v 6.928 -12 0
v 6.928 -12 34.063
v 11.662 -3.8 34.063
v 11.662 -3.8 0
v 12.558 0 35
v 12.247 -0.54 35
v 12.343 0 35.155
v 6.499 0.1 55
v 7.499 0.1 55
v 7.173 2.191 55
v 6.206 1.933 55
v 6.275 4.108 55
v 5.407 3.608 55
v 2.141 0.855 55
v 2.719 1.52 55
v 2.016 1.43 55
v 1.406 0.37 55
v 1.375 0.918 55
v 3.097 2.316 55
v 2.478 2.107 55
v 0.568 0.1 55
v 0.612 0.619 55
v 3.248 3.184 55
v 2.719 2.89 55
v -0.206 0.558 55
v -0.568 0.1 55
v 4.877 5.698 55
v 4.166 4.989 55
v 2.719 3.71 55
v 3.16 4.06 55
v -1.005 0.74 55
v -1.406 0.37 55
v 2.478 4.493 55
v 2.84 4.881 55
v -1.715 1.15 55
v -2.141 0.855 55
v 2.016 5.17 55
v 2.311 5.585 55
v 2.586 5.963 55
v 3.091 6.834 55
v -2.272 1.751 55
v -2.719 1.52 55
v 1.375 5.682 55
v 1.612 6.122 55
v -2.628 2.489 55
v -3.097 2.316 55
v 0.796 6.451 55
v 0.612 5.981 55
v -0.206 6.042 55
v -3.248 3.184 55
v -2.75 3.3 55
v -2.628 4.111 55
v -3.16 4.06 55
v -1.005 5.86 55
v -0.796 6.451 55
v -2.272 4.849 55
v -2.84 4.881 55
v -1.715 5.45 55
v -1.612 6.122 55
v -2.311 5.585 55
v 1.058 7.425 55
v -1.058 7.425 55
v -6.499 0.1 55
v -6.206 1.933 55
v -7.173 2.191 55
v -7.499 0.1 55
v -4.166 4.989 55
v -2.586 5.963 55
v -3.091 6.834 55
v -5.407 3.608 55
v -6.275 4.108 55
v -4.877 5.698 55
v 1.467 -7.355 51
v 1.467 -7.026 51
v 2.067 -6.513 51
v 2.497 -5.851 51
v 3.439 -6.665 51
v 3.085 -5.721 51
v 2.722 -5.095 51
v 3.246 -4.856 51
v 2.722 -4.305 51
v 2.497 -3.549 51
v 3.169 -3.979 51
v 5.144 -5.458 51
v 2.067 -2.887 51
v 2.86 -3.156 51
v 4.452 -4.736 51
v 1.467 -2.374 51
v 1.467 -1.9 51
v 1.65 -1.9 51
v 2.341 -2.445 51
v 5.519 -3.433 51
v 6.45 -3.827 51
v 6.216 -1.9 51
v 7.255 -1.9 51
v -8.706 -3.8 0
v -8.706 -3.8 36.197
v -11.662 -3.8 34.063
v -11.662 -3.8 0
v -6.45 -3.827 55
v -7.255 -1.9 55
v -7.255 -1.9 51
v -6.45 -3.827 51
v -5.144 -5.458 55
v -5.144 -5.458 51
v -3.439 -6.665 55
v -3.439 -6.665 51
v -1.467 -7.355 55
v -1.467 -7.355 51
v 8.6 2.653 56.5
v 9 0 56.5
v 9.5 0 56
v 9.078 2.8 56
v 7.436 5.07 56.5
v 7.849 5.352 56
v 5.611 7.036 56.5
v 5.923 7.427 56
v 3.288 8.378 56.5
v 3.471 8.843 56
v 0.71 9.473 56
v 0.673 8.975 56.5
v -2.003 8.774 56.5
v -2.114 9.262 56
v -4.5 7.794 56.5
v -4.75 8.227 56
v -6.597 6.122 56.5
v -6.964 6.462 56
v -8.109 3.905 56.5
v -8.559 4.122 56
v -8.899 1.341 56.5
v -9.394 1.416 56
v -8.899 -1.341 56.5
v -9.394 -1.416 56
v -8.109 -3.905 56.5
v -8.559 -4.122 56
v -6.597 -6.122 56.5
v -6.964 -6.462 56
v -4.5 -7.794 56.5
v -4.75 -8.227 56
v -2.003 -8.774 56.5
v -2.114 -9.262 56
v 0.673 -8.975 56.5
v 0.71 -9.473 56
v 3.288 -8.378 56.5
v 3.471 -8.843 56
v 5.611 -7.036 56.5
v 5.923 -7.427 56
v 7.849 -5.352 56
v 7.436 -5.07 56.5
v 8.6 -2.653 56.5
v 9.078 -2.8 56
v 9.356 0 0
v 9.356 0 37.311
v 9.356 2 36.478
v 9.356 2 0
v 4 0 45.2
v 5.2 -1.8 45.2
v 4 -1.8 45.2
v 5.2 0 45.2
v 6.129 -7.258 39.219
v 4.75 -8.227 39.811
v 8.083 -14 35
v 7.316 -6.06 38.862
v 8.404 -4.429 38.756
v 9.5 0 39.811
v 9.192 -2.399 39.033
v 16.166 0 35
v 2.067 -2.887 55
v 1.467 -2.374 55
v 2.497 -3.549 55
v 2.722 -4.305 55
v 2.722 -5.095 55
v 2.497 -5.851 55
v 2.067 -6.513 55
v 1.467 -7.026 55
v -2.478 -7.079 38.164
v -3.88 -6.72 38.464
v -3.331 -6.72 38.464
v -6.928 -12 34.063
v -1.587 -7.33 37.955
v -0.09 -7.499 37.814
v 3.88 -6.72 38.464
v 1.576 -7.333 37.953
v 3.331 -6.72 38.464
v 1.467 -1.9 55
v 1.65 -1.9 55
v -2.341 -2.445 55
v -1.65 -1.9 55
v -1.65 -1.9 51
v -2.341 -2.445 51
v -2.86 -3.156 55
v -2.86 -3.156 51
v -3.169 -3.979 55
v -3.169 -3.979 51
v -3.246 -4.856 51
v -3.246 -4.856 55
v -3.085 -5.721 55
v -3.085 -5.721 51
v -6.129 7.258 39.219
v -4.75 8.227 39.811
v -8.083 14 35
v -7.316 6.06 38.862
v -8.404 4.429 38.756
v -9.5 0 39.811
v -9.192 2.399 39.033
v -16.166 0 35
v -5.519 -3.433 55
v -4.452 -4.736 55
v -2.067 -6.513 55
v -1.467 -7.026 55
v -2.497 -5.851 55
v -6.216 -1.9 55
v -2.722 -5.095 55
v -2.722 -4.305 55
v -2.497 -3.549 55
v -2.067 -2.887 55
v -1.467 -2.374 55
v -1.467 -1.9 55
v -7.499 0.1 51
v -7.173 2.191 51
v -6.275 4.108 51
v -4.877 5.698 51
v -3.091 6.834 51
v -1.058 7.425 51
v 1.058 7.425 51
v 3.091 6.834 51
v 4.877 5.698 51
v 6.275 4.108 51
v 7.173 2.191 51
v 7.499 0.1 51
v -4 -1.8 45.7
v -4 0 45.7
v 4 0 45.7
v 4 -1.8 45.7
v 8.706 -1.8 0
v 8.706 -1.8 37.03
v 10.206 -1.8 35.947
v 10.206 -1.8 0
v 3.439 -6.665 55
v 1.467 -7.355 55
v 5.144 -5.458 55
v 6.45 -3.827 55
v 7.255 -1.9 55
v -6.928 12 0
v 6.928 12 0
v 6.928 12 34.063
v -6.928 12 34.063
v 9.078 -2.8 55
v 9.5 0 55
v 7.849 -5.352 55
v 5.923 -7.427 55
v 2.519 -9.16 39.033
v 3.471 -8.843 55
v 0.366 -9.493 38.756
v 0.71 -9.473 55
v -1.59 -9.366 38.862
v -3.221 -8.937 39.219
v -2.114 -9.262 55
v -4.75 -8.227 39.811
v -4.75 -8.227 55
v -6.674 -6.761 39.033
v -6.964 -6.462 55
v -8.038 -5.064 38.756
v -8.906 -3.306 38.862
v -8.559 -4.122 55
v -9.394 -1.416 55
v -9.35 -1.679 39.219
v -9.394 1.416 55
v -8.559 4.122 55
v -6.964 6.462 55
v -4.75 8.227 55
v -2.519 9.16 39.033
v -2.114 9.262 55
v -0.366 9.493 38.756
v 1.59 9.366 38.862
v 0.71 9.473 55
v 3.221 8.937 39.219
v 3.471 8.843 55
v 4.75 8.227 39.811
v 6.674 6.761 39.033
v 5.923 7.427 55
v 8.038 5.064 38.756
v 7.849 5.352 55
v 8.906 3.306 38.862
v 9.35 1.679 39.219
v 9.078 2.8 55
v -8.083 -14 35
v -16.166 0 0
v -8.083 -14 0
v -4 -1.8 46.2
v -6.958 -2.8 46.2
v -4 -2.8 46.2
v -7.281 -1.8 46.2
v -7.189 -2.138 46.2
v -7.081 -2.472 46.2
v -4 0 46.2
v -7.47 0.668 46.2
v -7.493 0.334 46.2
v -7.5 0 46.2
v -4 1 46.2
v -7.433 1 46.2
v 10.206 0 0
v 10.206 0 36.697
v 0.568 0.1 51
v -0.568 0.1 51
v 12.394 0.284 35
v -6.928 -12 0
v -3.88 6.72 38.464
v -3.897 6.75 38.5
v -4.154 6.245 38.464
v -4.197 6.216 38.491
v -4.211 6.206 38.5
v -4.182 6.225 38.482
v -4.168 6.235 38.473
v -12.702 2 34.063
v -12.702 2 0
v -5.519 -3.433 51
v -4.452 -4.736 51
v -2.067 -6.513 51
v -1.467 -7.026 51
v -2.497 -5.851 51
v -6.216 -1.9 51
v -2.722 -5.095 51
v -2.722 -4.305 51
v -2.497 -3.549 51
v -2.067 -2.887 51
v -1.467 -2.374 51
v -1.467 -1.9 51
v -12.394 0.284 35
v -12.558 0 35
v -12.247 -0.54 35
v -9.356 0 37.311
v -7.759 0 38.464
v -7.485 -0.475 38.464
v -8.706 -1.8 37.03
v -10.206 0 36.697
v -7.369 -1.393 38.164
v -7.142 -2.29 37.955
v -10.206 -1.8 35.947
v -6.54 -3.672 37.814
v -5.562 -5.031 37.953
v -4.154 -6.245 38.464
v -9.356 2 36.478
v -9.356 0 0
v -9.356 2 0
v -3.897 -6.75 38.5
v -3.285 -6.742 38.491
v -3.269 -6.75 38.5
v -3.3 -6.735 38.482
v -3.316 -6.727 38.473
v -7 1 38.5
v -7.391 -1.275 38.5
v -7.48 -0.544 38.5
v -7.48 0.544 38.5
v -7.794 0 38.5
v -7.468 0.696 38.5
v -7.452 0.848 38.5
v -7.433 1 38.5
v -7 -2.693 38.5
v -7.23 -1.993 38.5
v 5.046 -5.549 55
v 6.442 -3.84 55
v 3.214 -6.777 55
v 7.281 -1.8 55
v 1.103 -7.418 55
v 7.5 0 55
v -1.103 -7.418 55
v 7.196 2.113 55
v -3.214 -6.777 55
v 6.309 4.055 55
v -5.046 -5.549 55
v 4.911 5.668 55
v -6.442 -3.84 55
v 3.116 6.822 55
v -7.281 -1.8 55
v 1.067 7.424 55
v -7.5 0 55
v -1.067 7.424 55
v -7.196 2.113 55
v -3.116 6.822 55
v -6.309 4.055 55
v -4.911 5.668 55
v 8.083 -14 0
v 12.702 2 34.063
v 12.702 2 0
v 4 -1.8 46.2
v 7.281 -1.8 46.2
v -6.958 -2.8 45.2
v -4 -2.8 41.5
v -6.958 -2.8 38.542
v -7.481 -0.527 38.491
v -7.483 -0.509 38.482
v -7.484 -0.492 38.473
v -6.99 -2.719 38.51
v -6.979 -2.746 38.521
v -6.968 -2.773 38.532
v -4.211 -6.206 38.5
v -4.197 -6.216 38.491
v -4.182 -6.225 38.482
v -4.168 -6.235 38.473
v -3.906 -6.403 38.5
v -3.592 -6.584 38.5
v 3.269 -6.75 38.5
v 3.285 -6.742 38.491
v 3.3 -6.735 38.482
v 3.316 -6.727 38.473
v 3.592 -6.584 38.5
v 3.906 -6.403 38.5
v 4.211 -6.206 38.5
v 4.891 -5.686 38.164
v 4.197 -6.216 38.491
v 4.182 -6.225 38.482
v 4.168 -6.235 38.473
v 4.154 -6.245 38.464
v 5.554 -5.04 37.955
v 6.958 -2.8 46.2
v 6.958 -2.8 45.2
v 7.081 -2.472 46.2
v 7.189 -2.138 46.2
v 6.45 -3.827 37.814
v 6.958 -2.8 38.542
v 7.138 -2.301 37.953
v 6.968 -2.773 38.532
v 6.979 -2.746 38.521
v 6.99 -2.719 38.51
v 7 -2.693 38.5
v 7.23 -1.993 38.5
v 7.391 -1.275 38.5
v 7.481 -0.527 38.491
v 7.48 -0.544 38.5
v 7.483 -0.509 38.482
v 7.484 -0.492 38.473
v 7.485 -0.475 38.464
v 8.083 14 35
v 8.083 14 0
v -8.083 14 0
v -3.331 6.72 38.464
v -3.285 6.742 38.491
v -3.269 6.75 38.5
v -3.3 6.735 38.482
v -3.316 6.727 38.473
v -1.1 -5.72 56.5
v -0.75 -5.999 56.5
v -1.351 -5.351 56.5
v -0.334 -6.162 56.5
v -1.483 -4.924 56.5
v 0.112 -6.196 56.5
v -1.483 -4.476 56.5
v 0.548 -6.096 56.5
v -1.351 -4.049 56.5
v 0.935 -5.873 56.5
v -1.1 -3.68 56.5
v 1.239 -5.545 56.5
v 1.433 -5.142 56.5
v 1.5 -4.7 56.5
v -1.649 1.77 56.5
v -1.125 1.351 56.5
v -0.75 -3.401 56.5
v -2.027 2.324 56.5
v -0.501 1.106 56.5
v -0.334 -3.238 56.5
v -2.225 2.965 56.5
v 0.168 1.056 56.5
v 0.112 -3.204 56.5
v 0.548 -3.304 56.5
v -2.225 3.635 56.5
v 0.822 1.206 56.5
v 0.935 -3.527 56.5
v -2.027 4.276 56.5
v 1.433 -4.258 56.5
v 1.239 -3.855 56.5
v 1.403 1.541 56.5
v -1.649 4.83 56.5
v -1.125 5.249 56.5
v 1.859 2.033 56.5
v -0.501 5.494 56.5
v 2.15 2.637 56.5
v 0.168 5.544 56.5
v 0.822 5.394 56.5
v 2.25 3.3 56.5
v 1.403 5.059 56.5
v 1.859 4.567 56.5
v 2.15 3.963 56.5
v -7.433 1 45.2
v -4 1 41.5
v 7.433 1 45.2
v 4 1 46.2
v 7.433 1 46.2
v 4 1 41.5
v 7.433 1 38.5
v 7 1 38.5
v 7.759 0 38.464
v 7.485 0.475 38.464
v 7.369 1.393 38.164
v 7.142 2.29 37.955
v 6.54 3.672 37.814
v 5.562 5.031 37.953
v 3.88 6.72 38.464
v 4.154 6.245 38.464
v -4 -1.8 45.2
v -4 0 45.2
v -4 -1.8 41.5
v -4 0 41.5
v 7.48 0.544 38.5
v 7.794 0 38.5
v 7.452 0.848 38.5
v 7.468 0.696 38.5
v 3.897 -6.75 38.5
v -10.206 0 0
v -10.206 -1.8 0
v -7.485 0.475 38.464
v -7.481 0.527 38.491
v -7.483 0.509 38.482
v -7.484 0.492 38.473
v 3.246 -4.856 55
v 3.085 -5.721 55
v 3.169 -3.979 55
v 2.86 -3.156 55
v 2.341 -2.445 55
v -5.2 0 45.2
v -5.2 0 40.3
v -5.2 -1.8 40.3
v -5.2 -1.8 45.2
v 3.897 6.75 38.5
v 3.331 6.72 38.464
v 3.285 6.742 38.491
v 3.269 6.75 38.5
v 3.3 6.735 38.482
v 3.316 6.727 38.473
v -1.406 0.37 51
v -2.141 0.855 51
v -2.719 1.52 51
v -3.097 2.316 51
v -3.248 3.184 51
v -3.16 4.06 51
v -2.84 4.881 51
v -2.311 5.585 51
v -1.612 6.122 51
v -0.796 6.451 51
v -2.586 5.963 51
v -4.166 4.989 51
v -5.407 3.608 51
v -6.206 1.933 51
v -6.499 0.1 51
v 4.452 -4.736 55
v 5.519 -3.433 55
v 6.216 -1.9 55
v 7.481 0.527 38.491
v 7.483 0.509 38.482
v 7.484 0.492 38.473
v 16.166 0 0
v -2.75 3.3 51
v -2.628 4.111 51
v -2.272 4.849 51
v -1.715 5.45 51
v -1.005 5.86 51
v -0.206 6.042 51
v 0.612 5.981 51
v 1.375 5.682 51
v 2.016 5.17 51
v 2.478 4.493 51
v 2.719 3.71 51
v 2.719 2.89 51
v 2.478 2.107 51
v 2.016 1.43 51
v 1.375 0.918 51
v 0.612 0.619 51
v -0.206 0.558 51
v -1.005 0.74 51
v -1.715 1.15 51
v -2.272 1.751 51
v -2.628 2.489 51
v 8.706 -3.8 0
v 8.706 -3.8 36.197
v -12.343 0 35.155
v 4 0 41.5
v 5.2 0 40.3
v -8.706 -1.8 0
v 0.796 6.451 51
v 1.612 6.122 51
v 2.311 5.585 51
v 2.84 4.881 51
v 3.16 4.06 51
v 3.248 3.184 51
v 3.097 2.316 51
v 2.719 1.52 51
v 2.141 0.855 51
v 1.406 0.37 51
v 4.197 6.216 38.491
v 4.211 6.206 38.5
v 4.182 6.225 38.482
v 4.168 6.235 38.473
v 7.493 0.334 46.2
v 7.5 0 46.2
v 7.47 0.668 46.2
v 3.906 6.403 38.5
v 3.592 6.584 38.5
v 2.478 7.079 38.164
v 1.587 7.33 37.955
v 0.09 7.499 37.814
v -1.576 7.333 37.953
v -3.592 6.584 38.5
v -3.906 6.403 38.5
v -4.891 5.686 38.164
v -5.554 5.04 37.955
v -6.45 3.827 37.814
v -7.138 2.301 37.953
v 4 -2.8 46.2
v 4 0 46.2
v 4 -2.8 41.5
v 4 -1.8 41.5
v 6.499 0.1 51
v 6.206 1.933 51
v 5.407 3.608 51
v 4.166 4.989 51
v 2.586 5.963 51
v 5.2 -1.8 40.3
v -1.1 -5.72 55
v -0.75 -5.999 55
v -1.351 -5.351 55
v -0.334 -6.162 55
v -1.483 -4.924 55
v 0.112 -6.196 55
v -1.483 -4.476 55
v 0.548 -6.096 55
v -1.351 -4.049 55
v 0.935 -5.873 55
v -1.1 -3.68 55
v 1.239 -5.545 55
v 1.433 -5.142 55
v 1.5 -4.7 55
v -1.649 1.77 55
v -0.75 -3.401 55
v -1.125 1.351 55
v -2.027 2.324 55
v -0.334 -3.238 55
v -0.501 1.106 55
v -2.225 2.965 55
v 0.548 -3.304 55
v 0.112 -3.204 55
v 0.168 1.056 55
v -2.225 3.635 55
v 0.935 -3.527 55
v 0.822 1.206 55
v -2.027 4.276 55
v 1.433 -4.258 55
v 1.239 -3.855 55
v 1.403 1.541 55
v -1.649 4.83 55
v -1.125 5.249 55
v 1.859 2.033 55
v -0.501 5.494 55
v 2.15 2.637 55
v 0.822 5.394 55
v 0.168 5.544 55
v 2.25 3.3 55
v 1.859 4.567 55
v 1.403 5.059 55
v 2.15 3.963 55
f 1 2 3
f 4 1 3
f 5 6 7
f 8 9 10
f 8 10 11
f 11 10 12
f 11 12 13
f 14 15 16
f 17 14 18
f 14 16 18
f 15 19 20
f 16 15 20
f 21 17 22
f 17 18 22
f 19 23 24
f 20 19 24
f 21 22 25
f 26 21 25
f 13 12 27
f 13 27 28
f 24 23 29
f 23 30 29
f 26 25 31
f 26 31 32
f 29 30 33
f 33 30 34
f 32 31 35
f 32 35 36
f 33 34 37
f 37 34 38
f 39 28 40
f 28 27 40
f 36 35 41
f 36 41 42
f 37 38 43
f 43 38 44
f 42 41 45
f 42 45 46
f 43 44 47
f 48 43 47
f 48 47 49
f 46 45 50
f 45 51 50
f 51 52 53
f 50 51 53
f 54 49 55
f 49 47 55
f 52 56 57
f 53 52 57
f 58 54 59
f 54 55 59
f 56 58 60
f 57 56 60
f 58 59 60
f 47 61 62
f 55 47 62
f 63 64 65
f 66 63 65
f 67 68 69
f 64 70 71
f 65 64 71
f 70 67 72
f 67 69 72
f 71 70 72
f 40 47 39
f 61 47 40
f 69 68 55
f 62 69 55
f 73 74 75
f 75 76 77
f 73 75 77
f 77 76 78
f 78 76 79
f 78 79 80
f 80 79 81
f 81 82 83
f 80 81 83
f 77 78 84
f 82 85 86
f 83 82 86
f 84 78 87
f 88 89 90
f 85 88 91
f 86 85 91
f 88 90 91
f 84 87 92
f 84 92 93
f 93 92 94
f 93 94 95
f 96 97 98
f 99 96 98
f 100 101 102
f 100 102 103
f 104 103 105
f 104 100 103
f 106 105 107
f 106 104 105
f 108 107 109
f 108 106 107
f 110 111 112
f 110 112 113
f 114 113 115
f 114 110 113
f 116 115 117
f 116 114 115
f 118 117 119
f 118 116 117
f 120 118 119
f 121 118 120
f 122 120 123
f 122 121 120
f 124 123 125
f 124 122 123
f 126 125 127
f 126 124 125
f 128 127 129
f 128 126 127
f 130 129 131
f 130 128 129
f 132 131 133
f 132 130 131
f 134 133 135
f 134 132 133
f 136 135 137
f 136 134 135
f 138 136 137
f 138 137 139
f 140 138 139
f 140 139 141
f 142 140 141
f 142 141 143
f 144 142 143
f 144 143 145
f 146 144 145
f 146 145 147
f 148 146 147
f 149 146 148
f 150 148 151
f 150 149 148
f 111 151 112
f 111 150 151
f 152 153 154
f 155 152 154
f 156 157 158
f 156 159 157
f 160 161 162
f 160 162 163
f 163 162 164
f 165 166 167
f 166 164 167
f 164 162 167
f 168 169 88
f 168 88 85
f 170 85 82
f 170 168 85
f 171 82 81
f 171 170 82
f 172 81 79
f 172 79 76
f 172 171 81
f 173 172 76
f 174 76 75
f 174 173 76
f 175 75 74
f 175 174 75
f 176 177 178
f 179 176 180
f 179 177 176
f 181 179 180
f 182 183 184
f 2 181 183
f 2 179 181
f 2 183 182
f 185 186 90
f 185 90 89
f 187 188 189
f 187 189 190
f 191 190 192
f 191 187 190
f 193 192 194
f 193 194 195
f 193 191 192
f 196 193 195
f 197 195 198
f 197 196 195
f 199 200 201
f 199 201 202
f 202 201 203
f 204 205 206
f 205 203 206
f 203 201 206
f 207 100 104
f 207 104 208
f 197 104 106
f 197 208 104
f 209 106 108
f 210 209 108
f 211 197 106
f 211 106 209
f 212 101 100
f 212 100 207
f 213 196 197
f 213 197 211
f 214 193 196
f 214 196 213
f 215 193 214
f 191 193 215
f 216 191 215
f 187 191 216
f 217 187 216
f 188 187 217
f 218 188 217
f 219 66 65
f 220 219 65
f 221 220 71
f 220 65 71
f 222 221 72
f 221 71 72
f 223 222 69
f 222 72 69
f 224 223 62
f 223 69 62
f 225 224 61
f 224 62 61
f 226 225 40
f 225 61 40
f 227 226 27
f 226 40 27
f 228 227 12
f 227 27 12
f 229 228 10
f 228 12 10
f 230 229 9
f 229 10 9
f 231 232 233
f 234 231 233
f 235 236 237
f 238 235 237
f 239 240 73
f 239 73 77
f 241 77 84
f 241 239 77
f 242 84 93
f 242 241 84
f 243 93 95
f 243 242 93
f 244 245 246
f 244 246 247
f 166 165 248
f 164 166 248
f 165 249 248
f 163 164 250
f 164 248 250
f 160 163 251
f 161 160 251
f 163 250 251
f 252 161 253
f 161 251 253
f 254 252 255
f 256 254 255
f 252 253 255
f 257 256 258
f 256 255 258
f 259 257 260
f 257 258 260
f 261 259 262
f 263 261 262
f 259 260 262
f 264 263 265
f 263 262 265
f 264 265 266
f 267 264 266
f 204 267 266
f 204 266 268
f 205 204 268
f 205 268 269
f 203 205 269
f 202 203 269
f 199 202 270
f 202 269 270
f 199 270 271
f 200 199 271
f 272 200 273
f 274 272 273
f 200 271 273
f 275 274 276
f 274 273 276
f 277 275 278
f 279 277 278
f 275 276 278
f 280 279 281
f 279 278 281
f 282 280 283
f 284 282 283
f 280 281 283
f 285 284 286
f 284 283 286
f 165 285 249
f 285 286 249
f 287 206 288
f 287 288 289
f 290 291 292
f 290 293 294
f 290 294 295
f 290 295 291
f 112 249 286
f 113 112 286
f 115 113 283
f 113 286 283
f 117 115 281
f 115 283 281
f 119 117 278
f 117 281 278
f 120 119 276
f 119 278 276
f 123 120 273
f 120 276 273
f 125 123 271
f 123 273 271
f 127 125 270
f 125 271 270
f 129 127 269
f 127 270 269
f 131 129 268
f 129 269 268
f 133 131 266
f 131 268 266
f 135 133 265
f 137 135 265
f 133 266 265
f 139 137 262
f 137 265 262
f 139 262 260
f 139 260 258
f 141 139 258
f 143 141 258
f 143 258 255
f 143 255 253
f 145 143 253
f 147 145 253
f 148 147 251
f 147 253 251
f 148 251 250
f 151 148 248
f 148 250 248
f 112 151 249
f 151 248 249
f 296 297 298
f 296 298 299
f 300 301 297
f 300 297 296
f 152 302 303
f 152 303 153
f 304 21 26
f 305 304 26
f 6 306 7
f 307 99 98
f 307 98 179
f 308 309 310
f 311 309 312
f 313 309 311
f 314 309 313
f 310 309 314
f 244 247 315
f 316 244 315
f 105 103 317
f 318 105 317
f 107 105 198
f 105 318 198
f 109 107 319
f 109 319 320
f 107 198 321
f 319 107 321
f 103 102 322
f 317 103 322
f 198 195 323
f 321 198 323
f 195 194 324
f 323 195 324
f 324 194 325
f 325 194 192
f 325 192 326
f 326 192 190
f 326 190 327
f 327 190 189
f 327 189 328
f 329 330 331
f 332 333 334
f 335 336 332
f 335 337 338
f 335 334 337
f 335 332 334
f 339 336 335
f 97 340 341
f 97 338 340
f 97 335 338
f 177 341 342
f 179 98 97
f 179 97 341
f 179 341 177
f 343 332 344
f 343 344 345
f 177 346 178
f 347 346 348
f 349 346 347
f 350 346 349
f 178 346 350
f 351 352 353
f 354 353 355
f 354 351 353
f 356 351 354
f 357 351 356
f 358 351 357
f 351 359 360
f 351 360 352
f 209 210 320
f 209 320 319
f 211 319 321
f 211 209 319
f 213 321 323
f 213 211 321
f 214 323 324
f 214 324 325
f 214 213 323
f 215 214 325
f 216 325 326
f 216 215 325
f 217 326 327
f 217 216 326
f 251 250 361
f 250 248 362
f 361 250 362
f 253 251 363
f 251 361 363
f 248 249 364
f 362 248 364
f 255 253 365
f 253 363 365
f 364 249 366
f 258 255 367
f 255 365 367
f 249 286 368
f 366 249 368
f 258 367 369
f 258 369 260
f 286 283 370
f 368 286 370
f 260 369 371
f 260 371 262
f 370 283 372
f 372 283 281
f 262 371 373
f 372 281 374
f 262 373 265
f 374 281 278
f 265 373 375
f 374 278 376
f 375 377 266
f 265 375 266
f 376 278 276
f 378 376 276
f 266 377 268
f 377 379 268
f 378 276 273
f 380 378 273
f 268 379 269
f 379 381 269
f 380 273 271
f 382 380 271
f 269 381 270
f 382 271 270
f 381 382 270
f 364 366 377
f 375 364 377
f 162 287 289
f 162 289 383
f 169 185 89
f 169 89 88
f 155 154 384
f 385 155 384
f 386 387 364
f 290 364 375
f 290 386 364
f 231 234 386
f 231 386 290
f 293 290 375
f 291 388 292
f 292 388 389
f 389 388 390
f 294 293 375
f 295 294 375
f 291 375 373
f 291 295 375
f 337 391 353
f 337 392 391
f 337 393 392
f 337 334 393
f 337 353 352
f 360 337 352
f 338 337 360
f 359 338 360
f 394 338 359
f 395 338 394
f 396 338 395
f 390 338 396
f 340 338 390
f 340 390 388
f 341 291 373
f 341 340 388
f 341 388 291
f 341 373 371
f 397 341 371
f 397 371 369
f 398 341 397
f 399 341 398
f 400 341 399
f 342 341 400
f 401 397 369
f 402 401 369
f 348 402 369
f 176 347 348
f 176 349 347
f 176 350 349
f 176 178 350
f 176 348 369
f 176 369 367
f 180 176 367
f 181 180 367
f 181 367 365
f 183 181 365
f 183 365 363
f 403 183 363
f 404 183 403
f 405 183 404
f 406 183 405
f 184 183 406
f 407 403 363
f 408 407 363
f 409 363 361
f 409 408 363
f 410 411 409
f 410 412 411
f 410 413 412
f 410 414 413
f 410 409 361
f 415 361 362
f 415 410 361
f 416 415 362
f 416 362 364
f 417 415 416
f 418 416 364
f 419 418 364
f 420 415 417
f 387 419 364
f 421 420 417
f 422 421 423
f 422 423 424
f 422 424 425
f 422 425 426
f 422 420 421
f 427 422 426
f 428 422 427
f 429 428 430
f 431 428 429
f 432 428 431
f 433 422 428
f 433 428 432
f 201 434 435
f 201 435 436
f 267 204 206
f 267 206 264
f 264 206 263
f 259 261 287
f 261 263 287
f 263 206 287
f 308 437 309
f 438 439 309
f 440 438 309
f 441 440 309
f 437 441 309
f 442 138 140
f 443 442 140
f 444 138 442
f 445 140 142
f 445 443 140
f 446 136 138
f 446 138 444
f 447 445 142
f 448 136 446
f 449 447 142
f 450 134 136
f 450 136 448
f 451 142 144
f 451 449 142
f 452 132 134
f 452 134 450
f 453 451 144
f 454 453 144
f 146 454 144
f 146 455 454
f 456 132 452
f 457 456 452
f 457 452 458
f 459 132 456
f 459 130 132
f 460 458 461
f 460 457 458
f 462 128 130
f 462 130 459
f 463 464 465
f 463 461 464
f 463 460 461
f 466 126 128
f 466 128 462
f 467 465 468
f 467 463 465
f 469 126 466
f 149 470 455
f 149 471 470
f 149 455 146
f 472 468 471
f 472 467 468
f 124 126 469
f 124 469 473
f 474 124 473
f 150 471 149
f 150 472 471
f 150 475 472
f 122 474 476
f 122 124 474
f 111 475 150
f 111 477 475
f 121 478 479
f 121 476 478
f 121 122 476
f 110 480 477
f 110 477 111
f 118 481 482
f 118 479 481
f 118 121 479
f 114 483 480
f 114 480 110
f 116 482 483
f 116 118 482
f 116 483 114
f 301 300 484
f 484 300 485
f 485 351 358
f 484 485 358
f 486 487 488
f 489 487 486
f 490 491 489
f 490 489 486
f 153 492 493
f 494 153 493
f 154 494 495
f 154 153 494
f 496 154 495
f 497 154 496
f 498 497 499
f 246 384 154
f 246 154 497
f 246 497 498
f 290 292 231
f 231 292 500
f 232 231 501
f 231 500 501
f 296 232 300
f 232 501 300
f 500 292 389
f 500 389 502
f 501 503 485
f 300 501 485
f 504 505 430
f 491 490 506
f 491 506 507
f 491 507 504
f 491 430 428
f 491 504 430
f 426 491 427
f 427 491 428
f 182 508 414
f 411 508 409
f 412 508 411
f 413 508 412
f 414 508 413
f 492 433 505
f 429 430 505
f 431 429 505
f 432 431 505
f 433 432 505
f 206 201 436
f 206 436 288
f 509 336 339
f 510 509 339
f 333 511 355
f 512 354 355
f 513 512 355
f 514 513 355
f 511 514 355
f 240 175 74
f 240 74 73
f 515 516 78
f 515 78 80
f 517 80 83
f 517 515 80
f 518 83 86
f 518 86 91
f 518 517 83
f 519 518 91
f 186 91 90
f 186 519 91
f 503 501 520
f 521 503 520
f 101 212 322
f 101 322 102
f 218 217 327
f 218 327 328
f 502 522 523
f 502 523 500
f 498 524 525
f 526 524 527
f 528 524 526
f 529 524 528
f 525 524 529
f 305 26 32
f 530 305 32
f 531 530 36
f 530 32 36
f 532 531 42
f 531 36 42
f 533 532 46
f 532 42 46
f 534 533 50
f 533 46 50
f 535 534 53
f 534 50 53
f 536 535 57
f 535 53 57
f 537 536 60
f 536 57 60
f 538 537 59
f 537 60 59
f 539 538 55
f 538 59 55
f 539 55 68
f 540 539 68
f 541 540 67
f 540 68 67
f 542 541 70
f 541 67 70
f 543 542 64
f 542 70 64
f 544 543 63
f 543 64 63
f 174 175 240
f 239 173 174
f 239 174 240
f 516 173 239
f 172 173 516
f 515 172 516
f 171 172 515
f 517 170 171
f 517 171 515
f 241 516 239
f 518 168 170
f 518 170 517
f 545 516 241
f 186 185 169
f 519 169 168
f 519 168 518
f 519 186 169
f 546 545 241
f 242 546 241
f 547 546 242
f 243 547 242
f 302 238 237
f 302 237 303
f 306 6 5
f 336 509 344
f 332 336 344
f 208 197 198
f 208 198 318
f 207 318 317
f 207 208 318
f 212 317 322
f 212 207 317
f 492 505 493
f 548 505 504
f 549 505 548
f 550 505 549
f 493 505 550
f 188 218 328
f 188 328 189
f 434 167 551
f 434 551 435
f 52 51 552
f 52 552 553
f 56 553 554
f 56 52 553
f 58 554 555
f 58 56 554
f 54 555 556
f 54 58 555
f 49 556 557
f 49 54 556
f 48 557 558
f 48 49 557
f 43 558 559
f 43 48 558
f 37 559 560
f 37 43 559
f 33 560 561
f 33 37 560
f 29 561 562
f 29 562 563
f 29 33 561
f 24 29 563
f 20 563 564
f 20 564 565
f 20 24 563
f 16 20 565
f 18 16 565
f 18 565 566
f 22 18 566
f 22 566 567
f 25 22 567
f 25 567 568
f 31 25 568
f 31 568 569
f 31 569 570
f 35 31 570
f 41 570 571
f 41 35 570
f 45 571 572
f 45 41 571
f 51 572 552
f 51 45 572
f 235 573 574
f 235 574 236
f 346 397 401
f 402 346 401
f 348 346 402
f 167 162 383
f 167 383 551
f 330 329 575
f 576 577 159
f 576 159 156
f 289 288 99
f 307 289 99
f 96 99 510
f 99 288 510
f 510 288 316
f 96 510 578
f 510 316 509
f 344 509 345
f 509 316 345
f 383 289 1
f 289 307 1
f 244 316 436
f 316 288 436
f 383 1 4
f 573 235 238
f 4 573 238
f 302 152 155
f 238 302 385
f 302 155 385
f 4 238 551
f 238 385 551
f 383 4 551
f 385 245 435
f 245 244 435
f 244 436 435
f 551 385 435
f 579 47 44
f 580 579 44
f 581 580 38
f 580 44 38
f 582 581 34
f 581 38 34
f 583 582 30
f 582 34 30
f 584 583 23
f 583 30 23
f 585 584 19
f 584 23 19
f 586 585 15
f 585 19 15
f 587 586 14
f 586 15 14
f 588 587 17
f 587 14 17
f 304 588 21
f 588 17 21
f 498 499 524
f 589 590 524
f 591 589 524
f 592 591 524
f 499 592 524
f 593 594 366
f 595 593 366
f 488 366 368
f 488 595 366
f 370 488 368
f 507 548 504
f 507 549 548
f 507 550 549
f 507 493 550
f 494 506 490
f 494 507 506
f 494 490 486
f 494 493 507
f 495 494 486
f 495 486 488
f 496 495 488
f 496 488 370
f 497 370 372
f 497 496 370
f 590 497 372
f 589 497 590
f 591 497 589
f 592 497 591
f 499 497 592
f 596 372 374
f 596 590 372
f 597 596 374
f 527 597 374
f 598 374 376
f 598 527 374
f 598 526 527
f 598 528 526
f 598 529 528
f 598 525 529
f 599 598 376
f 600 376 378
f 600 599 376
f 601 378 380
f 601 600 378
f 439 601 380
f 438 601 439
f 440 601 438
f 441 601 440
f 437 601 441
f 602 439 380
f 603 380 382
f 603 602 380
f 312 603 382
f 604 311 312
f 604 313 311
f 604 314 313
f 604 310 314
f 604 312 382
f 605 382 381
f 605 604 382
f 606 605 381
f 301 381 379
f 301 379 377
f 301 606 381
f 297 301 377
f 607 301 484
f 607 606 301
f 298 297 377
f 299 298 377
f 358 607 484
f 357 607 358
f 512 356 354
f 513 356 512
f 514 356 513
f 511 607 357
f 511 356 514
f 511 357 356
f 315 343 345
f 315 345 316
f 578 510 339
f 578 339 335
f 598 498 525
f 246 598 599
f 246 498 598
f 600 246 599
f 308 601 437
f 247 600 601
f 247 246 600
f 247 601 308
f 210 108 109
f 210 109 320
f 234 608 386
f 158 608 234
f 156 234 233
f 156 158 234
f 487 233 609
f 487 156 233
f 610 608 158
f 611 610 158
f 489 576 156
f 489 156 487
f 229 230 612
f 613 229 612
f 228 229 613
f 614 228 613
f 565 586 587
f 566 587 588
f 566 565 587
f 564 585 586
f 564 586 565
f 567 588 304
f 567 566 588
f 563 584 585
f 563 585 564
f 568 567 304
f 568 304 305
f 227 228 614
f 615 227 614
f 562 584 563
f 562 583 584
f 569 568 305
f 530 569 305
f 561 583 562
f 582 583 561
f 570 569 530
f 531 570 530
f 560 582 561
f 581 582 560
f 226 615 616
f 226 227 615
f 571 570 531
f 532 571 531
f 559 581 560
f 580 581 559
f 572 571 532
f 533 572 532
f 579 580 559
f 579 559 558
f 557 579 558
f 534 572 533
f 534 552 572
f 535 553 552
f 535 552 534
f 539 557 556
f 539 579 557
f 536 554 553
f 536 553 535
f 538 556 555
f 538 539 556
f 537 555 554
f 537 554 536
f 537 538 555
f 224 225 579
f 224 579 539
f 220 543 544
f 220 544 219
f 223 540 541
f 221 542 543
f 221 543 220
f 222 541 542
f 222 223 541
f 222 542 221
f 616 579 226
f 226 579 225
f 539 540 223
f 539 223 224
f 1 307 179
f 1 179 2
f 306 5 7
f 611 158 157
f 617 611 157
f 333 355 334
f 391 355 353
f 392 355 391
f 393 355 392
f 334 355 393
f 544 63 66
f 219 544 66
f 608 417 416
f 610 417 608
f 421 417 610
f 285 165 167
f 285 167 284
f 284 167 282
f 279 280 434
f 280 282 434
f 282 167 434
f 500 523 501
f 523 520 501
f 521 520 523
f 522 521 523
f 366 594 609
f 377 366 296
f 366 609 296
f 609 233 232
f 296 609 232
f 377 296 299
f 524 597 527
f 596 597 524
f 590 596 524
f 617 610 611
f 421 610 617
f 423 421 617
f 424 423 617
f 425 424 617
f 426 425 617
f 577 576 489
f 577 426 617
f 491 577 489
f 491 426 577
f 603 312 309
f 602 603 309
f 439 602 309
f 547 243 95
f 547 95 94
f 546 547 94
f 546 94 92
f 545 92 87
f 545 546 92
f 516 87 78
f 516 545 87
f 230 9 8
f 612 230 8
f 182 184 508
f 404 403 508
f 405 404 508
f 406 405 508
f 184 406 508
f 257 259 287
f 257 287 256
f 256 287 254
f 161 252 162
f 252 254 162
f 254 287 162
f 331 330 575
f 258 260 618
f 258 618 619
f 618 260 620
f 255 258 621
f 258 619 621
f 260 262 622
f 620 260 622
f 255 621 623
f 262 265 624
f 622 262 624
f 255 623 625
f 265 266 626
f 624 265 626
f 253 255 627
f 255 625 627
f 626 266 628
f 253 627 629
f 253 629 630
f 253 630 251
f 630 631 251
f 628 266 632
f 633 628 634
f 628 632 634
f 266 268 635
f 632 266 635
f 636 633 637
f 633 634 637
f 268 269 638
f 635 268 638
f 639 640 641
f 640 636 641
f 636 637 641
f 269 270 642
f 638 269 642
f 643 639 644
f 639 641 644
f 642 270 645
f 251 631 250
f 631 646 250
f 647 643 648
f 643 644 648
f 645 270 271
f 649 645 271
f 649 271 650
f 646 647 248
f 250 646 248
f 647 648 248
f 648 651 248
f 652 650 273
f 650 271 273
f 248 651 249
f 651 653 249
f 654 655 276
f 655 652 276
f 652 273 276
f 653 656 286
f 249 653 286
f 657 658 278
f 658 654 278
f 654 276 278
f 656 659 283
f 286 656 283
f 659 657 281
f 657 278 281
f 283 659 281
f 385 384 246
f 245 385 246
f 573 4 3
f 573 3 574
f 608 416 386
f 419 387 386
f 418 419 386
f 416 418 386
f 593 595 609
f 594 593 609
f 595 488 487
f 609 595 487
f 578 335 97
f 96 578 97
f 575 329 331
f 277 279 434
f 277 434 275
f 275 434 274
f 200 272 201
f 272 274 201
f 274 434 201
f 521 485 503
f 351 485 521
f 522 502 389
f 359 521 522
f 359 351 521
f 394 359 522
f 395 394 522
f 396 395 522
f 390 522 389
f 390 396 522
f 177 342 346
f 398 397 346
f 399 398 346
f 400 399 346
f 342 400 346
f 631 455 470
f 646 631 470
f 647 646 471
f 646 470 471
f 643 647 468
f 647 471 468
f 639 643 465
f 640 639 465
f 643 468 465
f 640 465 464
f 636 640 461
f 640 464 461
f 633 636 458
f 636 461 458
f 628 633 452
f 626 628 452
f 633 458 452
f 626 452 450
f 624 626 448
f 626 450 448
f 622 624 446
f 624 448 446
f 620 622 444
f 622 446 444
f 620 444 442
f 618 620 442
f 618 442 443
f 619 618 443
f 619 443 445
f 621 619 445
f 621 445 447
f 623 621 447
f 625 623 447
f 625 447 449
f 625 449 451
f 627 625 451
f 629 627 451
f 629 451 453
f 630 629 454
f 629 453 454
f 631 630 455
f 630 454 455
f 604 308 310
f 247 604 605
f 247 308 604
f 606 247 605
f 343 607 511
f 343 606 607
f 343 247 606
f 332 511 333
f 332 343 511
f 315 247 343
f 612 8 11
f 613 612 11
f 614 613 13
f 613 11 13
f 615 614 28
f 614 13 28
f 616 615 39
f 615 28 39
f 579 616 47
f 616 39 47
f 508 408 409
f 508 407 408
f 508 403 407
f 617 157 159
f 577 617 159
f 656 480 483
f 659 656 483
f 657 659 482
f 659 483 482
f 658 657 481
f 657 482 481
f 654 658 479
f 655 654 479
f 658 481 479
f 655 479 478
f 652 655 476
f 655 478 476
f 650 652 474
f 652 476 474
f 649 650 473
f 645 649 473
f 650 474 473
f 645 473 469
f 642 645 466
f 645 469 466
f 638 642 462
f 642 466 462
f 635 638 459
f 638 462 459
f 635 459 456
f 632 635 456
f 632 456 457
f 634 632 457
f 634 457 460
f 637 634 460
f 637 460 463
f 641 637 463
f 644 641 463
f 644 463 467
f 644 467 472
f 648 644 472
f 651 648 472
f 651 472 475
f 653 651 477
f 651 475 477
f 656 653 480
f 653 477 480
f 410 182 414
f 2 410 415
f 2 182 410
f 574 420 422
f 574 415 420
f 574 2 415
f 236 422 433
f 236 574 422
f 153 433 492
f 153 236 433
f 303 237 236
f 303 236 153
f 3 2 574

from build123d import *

# Parameters (mm, degrees)
P_IDAT_VYSUNUT_M1_DEPTH       = 35
P_IDAT_VYSUNUT_M2_DEPTH       = 2
SKICA9_R                      = 9.5
SKICA9_R_2                    = 7.5
P_IDAT_VYSUNUT_M3_DEPTH       = 15
KRUHOV_POLE1_COUNT            = 6
SKICA10_R                     = 9.5
SKICA10_R_2                   = 7.5
P_IDAT_VYSUNUT_M4_DEPTH       = 1.5
ODEBRAT_VYSUNUT_M1_DEPTH      = 10
ODEBRAT_VYSUNUT_M1_DEPTH_BACK = 45.040700872
SKICA11_R                     = 7.5
P_IDAT_VYSUNUT_M5_DEPTH       = 6.7
ZKOSEN_2_SIZE                 = 3
P_IDAT_VYSUNUT_M6_REACH       = 43.016
P_IDAT_VYSUNUT_M7_DEPTH       = 1
P_IDAT_VYSUNUT_M8_DEPTH       = 1.8
SKICA18_R                     = 9.5
P_IDAT_VYSUNUT_M9_DEPTH       = 1.5
SKICA19_R                     = 2.25
SKICA19_R_2                   = 1.5
ODEBRAT_VYSUNUT_M3_DEPTH      = 1.5
P_IDAT_VYSUNUT_M11_DEPTH      = 4
P_IDAT_VYSUNUT_M11_2_DEPTH    = 4
SKICA20_R                     = 2.75
P_IDAT_VYSUNUT_M11_3_DEPTH    = 4
ZKOSEN_3_SIZE                 = 0.5


with BuildPart() as part:
    # Skica1 → Přidat vysunutím1 (new body)
    with BuildSketch(Plane.XY):
        Polygon((-16.165807537, 0), (-8.082903769, -14), (8.082903769, -14), (16.165807537, 0), (8.082903769, 14), (-8.082903769, 14), align=None)
        Polygon((12.701705922, 2), (6.92820323, 12), (-6.92820323, 12), (-12.701705922, 2), (-9.356406461, 2), (-9.356406461, 0), (-10.206406461, 0), (-10.206406461, -1.8), (-8.706406461, -1.8), (-8.706406461, -3.8), (-11.662475438, -3.8), (-6.92820323, -12), (6.92820323, -12), (11.662475438, -3.8), (8.706406461, -3.8), (8.706406461, -1.8), (10.206406461, -1.8), (10.206406461, 0), (9.356406461, 0), (9.356406461, 2), align=None, mode=Mode.SUBTRACT)
    extrude(amount=P_IDAT_VYSUNUT_M1_DEPTH)


with BuildPart() as body_2:
    # Skica6 → Přidat vysunutím2 (new body)
    with BuildSketch(Plane(origin=(0, 22.950819672, 27.540983607), x_dir=(-1, 0, 0), z_dir=(2.1639563313744068e-15, -0.6401843996644798, -0.768221279597376))):
        Polygon((-4.618802154, -19.46160575), (4.618802154, -19.46160575), (8.082903769, -11.651356074), (-8.082903769, -11.651356074), align=None)
    extrude(amount=P_IDAT_VYSUNUT_M2_DEPTH)


with BuildPart() as body_3:
    # Skica9 → Přidat vysunutím3 (new body)
    with BuildSketch(Plane.XY.offset(40)):
        Circle(SKICA9_R)
        Circle(SKICA9_R_2, mode=Mode.SUBTRACT)
    extrude(amount=P_IDAT_VYSUNUT_M3_DEPTH)


with BuildPart() as kruhov_pole1_1:
    # Kruhové pole1: pattern copy
    add(body_2.part.rotate(Axis((0, 0, 0), (0, 0, 1)), 1 * 360 / KRUHOV_POLE1_COUNT))


with BuildPart() as kruhov_pole1_2:
    # Kruhové pole1: pattern copy
    add(body_2.part.rotate(Axis((0, 0, 0), (0, 0, 1)), 2 * 360 / KRUHOV_POLE1_COUNT))


with BuildPart() as kruhov_pole1_3:
    # Kruhové pole1: pattern copy
    add(body_2.part.rotate(Axis((0, 0, 0), (0, 0, 1)), 3 * 360 / KRUHOV_POLE1_COUNT))


with BuildPart() as kruhov_pole1_4:
    # Kruhové pole1: pattern copy
    add(body_2.part.rotate(Axis((0, 0, 0), (0, 0, 1)), 4 * 360 / KRUHOV_POLE1_COUNT))


with BuildPart() as kruhov_pole1_5:
    # Kruhové pole1: pattern copy
    add(body_2.part.rotate(Axis((0, 0, 0), (0, 0, 1)), 5 * 360 / KRUHOV_POLE1_COUNT))


with BuildPart() as body_2_1:
    add(body_2.part)

    add(body_3.part)  # Přidat vysunutím4 merges body 3

    add(kruhov_pole1_1.part)  # Přidat vysunutím4 merges Kruhové pole1_1

    add(kruhov_pole1_2.part)  # Přidat vysunutím4 merges Kruhové pole1_2

    add(kruhov_pole1_3.part)  # Přidat vysunutím4 merges Kruhové pole1_3

    add(kruhov_pole1_4.part)  # Přidat vysunutím4 merges Kruhové pole1_4

    add(kruhov_pole1_5.part)  # Přidat vysunutím4 merges Kruhové pole1_5
    # Skica10 → Přidat vysunutím4 (add)
    with BuildSketch(Plane(origin=(0, 0, 40), x_dir=(-1, 0, 0), z_dir=(0, 0, -1))):
        with Locations(Location((0, 0, 0), (0, 0, 180))):
            Circle(SKICA10_R)
        with Locations(Location((0, 0, 0), (0, 0, 180))):
            Circle(SKICA10_R_2, mode=Mode.SUBTRACT)
    extrude(amount=P_IDAT_VYSUNUT_M4_DEPTH)

    # Skica11 → Odebrat vysunutím1 (cut, two sides: drawn at the far end of the back side and taken through both)
    with BuildSketch(Plane(origin=(0, 0, 38.5), x_dir=(-1, 0, 0), z_dir=(0, 0, -1)).offset(-ODEBRAT_VYSUNUT_M1_DEPTH_BACK)):
        with Locations(Location((0, 0, 0), (0, 0, 180))):
            Circle(SKICA11_R)
    extrude(amount=ODEBRAT_VYSUNUT_M1_DEPTH + ODEBRAT_VYSUNUT_M1_DEPTH_BACK, mode=Mode.SUBTRACT)

    # Skica12 → Přidat vysunutím5 (add)
    with BuildSketch(Plane(origin=(0, 0, 38.5), x_dir=(-1, 0, 0), z_dir=(0, 0, -1))):
        Polygon((-4, -1.8), (-5.2, -1.8), (-5.2, 0), (-4, 0), (-4, 1), (-7.5, 1), (-7.5, -2.8), (-4, -2.8), align=None)
        Polygon((7.5, -2.8), (7.5, 1), (4, 1), (4, 0), (5.2, 0), (5.2, -1.8), (4, -1.8), (4, -2.8), align=None)
    extrude(amount=-P_IDAT_VYSUNUT_M5_DEPTH)

    # Zkosení2
    zkosen_2_edges = [body_2_1.edges().sort_by_distance(p)[0] for p in [
        (-4, -2.3, 38.5),
        (4, 0.5, 38.5),
    ]]
    chamfer(zkosen_2_edges, length=ZKOSEN_2_SIZE)

    # Skica14 → Přidat vysunutím6 (add, up to next)
    with BuildSketch(Plane.XY.offset(35), mode=Mode.PRIVATE) as p_idat_vysunut_m6_sk1:
        Polygon((-9.356406461, 2), (-12.701705922, 2), (-11.662475438, -3.8), (-8.706406461, -3.8), (-8.706406461, -1.8), (-10.206406461, -1.8), (-10.206406461, 0), (-9.356406461, 0), align=None)
    p_idat_vysunut_m6_tool1 = extrude(p_idat_vysunut_m6_sk1.sketch, amount=P_IDAT_VYSUNUT_M6_REACH, mode=Mode.PRIVATE) - body_2_1.part
    # Skica14 → Přidat vysunutím6 (add, up to next)
    with BuildSketch(Plane.XY.offset(35), mode=Mode.PRIVATE) as p_idat_vysunut_m6_sk2:
        Polygon((11.662475438, -3.8), (8.706406461, -3.8), (8.706406461, -1.8), (10.206406461, -1.8), (10.206406461, 0), (9.356406461, 0), (9.356406461, 2), (12.701705922, 2), align=None)
    p_idat_vysunut_m6_tool2 = extrude(p_idat_vysunut_m6_sk2.sketch, amount=P_IDAT_VYSUNUT_M6_REACH, mode=Mode.PRIVATE) - body_2_1.part

    add(part.part)  # Přidat vysunutím6 merges part
    add(p_idat_vysunut_m6_tool1.solids().sort_by_distance((-10.739123, -0.872566, 35))[0])
    add(p_idat_vysunut_m6_tool2.solids().sort_by_distance((10.739123, -0.872566, 35))[0])

    # Skica16 → Přidat vysunutím7 (add)
    with BuildSketch(Plane.XY.offset(45.2)):
        with BuildLine():
            Line((-4, -2.8), (-4, 1))
            Line((-4, 1), (-7.433034374, 1))
            ThreePointArc((-7.433034374, 1), (-7.44201057, -0.930848364), (-6.957729515, -2.8))
            Line((-6.957729515, -2.8), (-4, -2.8))
        make_face()
        with BuildLine():
            Line((4, -2.8), (4, 1))
            Line((4, 1), (7.433034374, 1))
            ThreePointArc((7.433034374, 1), (7.44201057, -0.930848364), (6.957729515, -2.8))
            Line((6.957729515, -2.8), (4, -2.8))
        make_face()
    extrude(amount=P_IDAT_VYSUNUT_M7_DEPTH)

    # Skica17 → Přidat vysunutím8 (add)
    with BuildSketch(Plane(origin=(0, 0, 0), x_dir=(1, 0, 0), z_dir=(0, 1, 0))):
        Polygon((-4, -45.7), (4, -45.7), (4, -46.2), (7.5, -46.2), (7.5, -55), (-7.5, -55), (-7.5, -46.2), (-4, -46.2), align=None)
    extrude(amount=-P_IDAT_VYSUNUT_M8_DEPTH)


with BuildPart() as body_2_2:
    # Skica18 → Přidat vysunutím9 (new body)
    with BuildSketch(Plane.XY.offset(55)):
        Circle(SKICA18_R)
    extrude(amount=P_IDAT_VYSUNUT_M9_DEPTH)

    # Skica19 → Odebrat vysunutím3 (cut)
    with BuildSketch(Plane.XY.offset(56.5)):
        with Locations((0, 3.3)):
            Circle(SKICA19_R)
        with Locations((0, -4.7)):
            Circle(SKICA19_R_2)
    extrude(amount=-ODEBRAT_VYSUNUT_M3_DEPTH, mode=Mode.SUBTRACT)

    # Zkosení3
    zkosen_3_edges = [body_2_2.edges().sort_by_distance(p)[0] for p in [
        (-9.5, 0, 56.5),
    ]]
    chamfer(zkosen_3_edges, length=ZKOSEN_3_SIZE)


with BuildPart() as body_3_2:
    # Skica20 → Přidat vysunutím11 (new body)
    with BuildSketch(Plane(origin=(0, 0, 55), x_dir=(-1, 0, 0), z_dir=(0, 0, -1))):
        with BuildLine():
            Line((-7.255342859, -1.9), (-6.216108107, -1.9))
            ThreePointArc((-6.216108107, -1.9), (-5.027902464, -4.119489872), (-3.085455765, -5.721010638))
            ThreePointArc((-3.085455765, -5.721010638), (-3.042394764, -3.557050263), (-1.65, -1.9))
            Line((-1.65, -1.9), (-1.467140075, -1.9))
            Line((-1.467140075, -1.9), (-1.467140075, -2.37405933))
            ThreePointArc((-1.467140075, -2.37405933), (-2.75, -4.7), (-1.467140075, -7.02594067))
            Line((-1.467140075, -7.02594067), (-1.467140075, -7.355100271))
            ThreePointArc((-1.467140075, -7.355100271), (-5.143924268, -5.45802557), (-7.255342859, -1.9))
        make_face()
    extrude(amount=P_IDAT_VYSUNUT_M11_DEPTH)


with BuildPart() as body_4:
    # Skica20 → P_idat vysunut_m11 2 (new body)
    with BuildSketch(Plane(origin=(0, 0, 55), x_dir=(-1, 0, 0), z_dir=(0, 0, -1))):
        with BuildLine():
            Line((6.216108107, -1.9), (7.255342859, -1.9))
            ThreePointArc((7.255342859, -1.9), (5.143924268, -5.45802557), (1.467140075, -7.355100271))
            Line((1.467140075, -7.355100271), (1.467140075, -7.02594067))
            ThreePointArc((1.467140075, -7.02594067), (2.75, -4.7), (1.467140075, -2.37405933))
            Line((1.467140075, -2.37405933), (1.467140075, -1.9))
            Line((1.467140075, -1.9), (1.65, -1.9))
            ThreePointArc((1.65, -1.9), (3.042394764, -3.557050263), (3.085455765, -5.721010638))
            ThreePointArc((3.085455765, -5.721010638), (5.027902464, -4.119489872), (6.216108107, -1.9))
        make_face()
    extrude(amount=P_IDAT_VYSUNUT_M11_2_DEPTH)


with BuildPart() as body_5:
    # Skica20 → P_idat vysunut_m11 3 (new body)
    with BuildSketch(Plane(origin=(0, 0, 55), x_dir=(-1, 0, 0), z_dir=(0, 0, -1))):
        with BuildLine():
            Line((-7.499333304, 0.1), (-6.499230724, 0.1))
            ThreePointArc((-6.499230724, 0.1), (-4.836067799, 4.343092014), (-0.795512173, 6.451136364))
            ThreePointArc((-0.795512173, 6.451136364), (-3.247914749, 3.183596468), (-0.567890835, 0.1))
            Line((-0.567890835, 0.1), (0.567890835, 0.1))
            ThreePointArc((0.567890835, 0.1), (3.247914749, 3.183596468), (0.795512173, 6.451136364))
            ThreePointArc((0.795512173, 6.451136364), (4.836067799, 4.343092014), (6.499230724, 0.1))
            Line((6.499230724, 0.1), (7.499333304, 0.1))
            ThreePointArc((7.499333304, 0.1), (0, 7.5), (-7.499333304, 0.1))
        make_face()
        with Locations((0, 3.3)):
            Circle(SKICA20_R, mode=Mode.SUBTRACT)
    extrude(amount=P_IDAT_VYSUNUT_M11_3_DEPTH)


solid = Compound([body_2_1.part, body_2_2.part, body_3_2.part, body_4.part, body_5.part])
